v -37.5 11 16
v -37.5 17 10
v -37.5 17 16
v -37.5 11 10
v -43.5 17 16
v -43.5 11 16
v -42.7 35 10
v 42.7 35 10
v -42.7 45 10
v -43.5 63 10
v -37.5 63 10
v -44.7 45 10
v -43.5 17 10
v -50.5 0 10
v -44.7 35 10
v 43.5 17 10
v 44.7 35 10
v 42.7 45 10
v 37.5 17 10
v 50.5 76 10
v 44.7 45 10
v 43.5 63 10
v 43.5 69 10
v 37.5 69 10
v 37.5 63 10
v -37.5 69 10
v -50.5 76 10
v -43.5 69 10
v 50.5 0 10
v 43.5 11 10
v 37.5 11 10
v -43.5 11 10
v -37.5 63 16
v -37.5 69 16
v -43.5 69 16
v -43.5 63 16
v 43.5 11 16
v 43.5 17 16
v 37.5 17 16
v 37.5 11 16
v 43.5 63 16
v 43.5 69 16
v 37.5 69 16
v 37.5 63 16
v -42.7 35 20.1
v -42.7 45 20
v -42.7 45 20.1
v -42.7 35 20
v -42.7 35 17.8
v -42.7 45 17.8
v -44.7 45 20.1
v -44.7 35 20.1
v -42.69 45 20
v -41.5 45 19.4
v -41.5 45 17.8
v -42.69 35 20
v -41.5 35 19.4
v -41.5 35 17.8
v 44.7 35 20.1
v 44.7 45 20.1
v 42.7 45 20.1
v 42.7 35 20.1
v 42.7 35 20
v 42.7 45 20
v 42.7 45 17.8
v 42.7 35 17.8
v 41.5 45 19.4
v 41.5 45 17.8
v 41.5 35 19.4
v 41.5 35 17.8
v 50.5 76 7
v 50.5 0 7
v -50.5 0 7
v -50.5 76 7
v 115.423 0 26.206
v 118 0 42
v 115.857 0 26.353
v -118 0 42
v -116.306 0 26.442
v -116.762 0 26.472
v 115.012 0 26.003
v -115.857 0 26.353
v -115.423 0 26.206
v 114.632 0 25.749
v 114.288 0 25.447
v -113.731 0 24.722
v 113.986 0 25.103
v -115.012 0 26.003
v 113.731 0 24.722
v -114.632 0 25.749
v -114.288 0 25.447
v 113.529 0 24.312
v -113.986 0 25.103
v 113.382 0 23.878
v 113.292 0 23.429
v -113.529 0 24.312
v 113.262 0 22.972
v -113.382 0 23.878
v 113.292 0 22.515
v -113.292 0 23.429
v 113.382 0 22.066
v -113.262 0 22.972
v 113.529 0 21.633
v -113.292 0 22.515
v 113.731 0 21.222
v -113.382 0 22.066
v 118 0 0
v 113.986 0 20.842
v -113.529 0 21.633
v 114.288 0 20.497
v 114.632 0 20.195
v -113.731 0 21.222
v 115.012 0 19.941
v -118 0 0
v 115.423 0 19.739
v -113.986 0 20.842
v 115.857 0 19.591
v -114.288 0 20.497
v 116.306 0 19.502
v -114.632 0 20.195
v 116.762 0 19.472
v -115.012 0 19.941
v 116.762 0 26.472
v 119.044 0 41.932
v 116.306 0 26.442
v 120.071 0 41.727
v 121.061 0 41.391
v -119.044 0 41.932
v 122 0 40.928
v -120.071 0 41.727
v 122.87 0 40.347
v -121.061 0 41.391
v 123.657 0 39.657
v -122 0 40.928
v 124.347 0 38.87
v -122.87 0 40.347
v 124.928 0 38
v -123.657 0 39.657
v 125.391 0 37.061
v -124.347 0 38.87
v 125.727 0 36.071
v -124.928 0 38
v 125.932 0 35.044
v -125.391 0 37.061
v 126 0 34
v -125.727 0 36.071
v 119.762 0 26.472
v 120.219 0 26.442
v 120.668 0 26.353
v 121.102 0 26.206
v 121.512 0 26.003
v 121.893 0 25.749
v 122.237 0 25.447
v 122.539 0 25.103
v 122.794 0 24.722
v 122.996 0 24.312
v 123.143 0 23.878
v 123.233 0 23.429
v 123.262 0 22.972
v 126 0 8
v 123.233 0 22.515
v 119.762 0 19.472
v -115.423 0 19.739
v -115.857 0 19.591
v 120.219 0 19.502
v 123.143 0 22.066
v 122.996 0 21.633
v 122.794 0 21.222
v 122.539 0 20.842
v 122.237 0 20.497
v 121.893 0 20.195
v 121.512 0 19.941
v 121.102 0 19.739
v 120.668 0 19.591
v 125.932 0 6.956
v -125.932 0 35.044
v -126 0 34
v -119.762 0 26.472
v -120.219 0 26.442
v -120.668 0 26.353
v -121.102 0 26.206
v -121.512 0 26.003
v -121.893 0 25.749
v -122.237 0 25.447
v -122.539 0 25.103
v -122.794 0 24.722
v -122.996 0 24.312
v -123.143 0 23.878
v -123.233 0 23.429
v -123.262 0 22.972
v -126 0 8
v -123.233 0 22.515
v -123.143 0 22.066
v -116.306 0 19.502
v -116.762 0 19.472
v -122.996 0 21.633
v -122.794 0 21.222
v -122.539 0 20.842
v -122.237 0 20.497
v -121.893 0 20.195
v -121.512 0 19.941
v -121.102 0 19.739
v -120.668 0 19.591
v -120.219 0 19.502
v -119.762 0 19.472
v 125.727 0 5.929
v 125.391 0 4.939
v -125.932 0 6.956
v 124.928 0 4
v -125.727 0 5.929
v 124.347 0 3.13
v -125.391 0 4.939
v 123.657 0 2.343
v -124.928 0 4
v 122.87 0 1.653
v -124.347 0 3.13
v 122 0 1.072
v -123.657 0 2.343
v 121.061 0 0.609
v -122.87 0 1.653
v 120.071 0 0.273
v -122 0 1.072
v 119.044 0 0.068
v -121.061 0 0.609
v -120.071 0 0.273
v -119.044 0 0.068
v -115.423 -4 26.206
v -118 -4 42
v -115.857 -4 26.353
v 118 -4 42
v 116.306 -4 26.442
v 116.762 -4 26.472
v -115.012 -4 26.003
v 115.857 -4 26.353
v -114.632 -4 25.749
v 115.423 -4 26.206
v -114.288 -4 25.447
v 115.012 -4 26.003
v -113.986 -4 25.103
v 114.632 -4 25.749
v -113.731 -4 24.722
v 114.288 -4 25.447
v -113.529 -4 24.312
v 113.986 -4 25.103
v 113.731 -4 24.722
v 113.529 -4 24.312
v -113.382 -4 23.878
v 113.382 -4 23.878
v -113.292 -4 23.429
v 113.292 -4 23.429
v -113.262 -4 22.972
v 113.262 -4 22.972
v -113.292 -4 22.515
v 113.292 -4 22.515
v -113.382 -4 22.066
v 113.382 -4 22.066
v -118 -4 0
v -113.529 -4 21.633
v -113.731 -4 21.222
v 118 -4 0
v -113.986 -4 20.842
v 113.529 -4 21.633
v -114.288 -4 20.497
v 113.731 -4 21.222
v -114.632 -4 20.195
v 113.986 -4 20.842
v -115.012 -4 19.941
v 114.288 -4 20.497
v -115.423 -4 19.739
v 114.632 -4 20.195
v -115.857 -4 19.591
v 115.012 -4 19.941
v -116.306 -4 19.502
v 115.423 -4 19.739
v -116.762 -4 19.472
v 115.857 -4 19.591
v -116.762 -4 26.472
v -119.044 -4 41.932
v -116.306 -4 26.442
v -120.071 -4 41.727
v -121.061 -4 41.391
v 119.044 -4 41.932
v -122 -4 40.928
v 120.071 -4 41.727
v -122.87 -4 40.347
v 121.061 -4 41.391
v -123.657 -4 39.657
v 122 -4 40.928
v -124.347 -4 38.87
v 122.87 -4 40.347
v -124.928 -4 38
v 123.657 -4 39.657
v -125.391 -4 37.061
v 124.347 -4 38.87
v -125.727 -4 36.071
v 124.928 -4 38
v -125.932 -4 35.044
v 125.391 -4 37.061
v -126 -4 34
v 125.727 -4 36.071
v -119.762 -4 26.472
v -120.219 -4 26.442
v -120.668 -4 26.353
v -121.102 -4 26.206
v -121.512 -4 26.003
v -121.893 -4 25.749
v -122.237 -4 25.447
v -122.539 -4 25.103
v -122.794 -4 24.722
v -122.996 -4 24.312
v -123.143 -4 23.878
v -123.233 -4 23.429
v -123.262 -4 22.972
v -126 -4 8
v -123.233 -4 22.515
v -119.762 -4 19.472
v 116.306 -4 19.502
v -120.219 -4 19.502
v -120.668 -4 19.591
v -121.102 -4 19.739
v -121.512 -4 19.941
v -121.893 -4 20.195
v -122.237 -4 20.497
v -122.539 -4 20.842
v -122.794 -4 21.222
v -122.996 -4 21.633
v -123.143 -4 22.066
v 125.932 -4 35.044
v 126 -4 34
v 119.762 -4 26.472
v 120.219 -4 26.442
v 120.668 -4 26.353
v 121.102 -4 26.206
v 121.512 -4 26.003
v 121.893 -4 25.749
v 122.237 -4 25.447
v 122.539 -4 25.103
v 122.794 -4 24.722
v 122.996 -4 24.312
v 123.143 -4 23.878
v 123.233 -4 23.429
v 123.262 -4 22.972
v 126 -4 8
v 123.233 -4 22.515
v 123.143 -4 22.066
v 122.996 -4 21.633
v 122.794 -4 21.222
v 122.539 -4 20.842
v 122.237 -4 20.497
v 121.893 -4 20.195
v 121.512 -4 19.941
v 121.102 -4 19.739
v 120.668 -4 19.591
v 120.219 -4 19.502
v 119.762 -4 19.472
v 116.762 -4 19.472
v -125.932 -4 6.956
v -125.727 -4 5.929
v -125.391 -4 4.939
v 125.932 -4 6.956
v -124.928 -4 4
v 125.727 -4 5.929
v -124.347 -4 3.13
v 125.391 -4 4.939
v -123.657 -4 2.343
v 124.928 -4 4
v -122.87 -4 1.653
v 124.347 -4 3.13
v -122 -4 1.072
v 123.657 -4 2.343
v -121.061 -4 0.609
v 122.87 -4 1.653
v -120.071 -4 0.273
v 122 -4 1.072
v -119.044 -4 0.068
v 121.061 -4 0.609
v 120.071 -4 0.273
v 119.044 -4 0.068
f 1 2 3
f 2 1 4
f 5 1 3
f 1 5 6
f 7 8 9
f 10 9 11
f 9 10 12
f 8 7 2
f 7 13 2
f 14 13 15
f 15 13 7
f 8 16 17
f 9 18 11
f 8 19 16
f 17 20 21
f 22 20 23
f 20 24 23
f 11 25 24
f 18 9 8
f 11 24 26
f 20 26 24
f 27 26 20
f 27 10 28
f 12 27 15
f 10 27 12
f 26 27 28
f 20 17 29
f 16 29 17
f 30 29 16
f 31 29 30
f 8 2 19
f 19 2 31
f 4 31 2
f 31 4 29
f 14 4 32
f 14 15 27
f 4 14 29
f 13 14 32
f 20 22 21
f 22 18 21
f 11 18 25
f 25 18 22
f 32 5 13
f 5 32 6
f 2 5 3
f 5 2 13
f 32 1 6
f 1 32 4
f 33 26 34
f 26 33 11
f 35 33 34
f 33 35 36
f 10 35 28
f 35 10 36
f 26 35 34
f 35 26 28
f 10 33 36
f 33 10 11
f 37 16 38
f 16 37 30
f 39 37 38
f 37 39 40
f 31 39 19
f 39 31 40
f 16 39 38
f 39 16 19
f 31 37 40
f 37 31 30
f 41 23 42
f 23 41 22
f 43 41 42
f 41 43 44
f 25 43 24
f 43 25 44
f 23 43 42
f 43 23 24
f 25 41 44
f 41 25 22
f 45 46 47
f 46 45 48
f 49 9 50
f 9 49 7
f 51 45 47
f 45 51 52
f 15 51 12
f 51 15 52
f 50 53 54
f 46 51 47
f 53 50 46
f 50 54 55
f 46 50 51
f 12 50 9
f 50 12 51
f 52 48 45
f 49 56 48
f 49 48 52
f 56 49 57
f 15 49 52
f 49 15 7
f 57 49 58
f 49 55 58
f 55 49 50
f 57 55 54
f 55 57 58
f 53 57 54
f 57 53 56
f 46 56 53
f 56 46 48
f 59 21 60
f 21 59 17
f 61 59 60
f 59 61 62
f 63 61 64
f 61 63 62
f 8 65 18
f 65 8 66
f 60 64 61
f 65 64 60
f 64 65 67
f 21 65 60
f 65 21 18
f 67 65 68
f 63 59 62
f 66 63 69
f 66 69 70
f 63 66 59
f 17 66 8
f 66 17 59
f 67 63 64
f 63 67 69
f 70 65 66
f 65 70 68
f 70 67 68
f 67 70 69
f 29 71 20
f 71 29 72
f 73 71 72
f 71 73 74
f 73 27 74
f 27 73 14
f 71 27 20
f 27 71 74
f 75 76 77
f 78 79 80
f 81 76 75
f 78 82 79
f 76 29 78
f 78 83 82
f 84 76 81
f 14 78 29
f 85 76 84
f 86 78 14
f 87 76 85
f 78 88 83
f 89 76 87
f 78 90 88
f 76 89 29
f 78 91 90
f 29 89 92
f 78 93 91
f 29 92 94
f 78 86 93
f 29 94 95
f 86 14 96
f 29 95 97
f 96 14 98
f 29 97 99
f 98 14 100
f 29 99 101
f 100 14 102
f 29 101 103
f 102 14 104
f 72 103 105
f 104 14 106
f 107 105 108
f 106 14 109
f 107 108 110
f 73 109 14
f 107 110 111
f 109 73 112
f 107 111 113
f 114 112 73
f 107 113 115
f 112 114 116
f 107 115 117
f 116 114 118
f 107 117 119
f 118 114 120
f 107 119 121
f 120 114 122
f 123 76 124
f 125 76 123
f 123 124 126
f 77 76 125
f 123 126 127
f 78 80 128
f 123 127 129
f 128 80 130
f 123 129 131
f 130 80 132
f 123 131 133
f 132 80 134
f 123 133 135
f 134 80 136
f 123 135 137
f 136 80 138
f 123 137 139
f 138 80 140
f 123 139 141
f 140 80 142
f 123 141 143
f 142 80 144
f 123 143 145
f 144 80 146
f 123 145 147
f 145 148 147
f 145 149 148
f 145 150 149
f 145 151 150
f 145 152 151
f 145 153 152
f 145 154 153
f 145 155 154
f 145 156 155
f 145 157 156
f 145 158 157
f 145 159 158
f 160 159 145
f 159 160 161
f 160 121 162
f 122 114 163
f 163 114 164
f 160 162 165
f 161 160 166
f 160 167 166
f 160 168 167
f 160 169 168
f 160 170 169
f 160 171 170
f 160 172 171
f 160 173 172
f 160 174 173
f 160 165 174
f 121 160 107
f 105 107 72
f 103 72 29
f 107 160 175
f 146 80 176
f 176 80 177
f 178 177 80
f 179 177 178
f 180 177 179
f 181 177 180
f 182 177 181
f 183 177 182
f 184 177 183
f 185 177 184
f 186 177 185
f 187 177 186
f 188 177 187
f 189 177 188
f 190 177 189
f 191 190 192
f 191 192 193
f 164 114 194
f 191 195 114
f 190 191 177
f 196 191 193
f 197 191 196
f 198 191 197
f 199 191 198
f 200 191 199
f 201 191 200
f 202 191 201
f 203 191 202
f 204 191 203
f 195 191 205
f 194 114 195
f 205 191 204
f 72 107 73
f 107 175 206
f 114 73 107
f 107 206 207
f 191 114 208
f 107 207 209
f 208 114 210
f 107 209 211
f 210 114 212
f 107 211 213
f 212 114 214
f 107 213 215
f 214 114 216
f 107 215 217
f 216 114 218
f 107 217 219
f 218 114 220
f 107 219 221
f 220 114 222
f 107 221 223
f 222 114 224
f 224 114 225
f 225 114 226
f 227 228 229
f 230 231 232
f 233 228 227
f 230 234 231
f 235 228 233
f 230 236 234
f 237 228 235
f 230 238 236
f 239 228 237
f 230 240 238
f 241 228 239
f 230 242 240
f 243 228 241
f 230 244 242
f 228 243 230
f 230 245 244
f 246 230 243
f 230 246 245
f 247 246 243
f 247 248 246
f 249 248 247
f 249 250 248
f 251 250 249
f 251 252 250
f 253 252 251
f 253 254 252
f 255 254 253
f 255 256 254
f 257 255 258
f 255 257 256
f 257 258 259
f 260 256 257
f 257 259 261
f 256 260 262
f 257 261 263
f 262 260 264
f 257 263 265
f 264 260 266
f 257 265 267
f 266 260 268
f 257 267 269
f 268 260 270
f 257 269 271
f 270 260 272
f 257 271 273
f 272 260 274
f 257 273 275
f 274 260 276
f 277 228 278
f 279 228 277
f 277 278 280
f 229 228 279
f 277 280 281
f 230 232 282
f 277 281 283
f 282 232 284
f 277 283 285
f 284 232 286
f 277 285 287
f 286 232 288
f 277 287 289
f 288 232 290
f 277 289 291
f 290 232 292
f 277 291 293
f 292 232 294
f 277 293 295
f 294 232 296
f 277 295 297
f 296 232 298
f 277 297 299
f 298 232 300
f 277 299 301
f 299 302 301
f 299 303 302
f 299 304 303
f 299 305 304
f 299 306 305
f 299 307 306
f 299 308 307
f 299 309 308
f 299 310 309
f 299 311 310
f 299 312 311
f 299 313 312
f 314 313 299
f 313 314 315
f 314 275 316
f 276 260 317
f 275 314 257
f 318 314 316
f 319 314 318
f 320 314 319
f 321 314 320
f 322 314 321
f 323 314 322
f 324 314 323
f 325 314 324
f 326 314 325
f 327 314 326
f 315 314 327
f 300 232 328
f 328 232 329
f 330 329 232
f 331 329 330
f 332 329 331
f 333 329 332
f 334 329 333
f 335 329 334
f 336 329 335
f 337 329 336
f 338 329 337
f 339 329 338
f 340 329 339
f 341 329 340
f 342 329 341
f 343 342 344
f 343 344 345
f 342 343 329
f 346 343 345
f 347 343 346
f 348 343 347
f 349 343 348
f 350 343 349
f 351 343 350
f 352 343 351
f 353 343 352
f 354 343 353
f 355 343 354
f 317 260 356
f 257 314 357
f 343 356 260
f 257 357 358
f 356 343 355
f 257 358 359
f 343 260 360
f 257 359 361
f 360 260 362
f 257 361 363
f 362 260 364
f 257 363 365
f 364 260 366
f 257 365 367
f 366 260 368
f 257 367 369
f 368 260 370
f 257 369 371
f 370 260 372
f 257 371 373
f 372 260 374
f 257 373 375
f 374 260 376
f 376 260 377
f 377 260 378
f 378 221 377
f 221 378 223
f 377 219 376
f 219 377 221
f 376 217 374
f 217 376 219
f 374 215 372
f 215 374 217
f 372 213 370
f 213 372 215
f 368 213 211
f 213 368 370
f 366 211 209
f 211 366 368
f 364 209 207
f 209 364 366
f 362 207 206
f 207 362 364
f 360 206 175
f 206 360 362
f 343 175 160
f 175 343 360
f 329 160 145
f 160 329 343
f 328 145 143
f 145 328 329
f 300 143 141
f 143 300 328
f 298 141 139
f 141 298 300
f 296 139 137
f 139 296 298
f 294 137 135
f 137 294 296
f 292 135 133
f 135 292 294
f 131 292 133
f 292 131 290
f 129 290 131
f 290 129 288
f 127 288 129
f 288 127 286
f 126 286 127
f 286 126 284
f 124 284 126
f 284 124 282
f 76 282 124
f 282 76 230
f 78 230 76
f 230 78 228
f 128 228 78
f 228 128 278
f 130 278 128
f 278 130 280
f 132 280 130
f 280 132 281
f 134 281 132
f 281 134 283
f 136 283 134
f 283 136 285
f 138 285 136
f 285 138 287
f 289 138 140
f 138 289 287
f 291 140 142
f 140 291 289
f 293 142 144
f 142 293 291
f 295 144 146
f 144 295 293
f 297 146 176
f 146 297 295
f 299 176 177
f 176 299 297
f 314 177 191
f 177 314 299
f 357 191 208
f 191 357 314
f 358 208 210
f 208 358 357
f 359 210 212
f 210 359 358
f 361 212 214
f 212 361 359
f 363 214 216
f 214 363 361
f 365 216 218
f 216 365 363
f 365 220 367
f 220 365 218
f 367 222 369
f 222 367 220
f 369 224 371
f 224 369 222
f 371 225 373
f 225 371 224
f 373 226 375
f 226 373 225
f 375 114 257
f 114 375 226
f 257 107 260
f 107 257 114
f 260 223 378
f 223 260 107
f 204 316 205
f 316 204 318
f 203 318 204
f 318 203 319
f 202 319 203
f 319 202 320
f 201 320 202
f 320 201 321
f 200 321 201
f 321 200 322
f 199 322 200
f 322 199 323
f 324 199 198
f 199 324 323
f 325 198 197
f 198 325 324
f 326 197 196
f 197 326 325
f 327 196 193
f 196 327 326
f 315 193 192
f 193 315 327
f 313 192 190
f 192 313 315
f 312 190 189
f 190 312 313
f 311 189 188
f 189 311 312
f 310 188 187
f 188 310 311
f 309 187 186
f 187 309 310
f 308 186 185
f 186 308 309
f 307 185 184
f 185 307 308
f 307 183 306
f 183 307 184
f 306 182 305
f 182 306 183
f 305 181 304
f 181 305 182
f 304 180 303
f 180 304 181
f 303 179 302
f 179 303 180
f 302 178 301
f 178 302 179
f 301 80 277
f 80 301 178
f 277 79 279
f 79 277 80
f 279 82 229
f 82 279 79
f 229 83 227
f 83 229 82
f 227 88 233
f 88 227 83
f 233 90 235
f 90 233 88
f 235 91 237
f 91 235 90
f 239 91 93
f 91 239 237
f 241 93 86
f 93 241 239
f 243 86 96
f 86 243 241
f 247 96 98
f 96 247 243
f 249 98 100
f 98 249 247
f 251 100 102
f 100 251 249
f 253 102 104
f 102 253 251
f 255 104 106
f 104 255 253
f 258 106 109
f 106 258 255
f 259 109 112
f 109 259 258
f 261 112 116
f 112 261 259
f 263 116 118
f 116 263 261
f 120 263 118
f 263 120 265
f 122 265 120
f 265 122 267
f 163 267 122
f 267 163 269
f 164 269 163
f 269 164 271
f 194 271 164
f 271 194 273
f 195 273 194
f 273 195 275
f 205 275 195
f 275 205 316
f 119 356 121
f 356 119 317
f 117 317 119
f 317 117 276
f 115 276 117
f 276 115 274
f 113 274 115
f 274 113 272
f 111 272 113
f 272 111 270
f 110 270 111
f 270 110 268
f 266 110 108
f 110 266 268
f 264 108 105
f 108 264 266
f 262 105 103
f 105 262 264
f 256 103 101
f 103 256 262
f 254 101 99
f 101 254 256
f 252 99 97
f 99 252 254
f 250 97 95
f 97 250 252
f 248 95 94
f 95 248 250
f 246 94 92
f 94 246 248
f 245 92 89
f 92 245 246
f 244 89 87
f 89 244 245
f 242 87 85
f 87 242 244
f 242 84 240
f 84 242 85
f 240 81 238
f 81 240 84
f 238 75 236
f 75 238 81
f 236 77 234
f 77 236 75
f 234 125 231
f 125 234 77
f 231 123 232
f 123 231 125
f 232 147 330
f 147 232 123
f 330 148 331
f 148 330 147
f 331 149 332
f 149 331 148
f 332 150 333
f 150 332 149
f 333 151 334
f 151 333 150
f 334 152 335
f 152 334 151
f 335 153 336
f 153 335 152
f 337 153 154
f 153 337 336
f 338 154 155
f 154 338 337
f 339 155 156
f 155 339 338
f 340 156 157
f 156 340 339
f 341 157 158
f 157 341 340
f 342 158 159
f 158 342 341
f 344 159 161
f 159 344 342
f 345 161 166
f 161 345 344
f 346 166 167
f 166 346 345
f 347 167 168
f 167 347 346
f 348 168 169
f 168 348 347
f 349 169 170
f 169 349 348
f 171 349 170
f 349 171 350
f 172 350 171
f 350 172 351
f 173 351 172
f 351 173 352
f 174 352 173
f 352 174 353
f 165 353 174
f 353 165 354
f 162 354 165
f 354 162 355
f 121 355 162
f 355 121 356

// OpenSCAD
// Lab Rax generic equipment tray + faceplate (wizard template).
// Faceplate = the Pi4 baseline faceplate (pi4_baseline.scad), generalised to N U.
// The wizard appends override assignments at the end of this file.
// PROPOSED, UNVALIDATED: printed fit, strength and rack clearance are UNKNOWN.
$fn=48;
part="assembly";            // assembly, faceplate, tray, combined
// Device envelope (mm). Origin of hole coordinates = device front-left corner, seen from above.
dev_w=85; dev_d=56; dev_h=20;
holes=[];                   // [[x,y],...] mounting hole centres
hole_d=2.7;                 // device mounting hole diameter
device_mount="inserts";     // inserts, pegs, clips, straps
standoff=6;                 // device lift above tray floor
insert_pilot=3.2;           // pilot for heat-set insert (inserts mode)
board_t=1.6;                // board/flange thickness (pegs, clips)
joint="screw";              // screw, snap, single
u=1;                        // faceplate height in rack units
keystones=[];               // [x,...] keystone centres on faceplate (X=0 centre)
ks_w=14.5; ks_h=16;         // standard keystone opening
ports=[];                   // [[x,z,w,h,r],...] faceplate cut-outs, z from plate bottom, r=corner radius
front_gap=12;               // device front to faceplate rear face
margin=8;                   // tray border around device

// Owner default 2026-10-18: 4 mm thick plate with rounded corners (Pi4 print was 3 mm, square).
plate_w=252; plate_t=4; plate_r=8; plate_h=u*44.45-2.45;
nudge=0;                    // render-repair only: tiny size offset applied when OpenSCAD 2021 emits a sliver
ks_front=2;                // keystone clips need a thin wall: plate is pocketed from behind down to this
tray_t=3; tray_z=7;
tray_w=dev_w+2*margin; tray_d=dev_d+front_gap+margin;
tray_x=-tray_w/2; tray_y=0;
dev_x=-dev_w/2; dev_y=front_gap; floor_top=tray_z+tray_t;
jx=min(40,tray_w/2-12); joint_x=[-jx,jx];
tongue_w=12; tongue_depth=7; tongue_h=3; tongue_z=tray_z+3.5;
slot_clear=0.3; boss_d=9; m3_clear=3.4; joint_pilot=4.0;  // 4.0 = the printed, well-fitting Pi4 trial

module capsule2d(len=10,diam=7){hull(){translate([-(len-diam)/2,0])circle(d=diam);translate([(len-diam)/2,0])circle(d=diam);}}
module rrect(w,h,r){rr=min(r,w/2-0.01,h/2-0.01);if(rr<=0)square([w,h],center=true);else offset(r=rr)square([w-2*rr,h-2*rr],center=true);}

// Faceplate outline seen from the front: 2D X = rack X, 2D Y = height Z.
// rear=true cuts the larger keystone pocket instead of the keystone opening.
module plate2d(rear=false){
 difference(){
  hull()for(sx=[-1,1],sz=[-1,1])translate([sx*(plate_w/2-plate_r),plate_h/2+sz*(plate_h/2-plate_r)])circle(r=plate_r+nudge);
  for(i=[0:u-1],x=[-118.2625,118.2625])translate([x,i*44.45+21+1.9722])capsule2d();
  for(x=keystones)if(rear)translate([x,plate_h/2])square([ks_w+4+nudge,ks_h+6+nudge],center=true);
                  else translate([x,plate_h/2])square([ks_w,ks_h],center=true);
  for(p=ports)translate([p[0],p[1]])rrect(p[2],p[3],p[4]);
 }
}
// Plate between y=y0 (front) and y0+t, built from the 2D outline (cleaner meshes than 3D cuts in OpenSCAD 2021).
module plate_layer(y0,t,rear=false){translate([0,y0+t,0])rotate([90,0,0])linear_extrude(height=t)plate2d(rear);}

module faceplate(){
 difference(){
  union(){
   // Front layer keeps the keystone opening; with keystones, the rear layer is pocketed so jacks grip ks_front.
   if(len(keystones)>0&&plate_t>ks_front){plate_layer(-plate_t,ks_front);plate_layer(-plate_t+ks_front,plate_t-ks_front,true);}
   else plate_layer(-plate_t,plate_t);
   if(joint=="screw"){
    for(x=joint_x)translate([x-tongue_w/2,0,tongue_z])cube([tongue_w,tongue_depth,tongue_h]);
    for(x=joint_x)translate([x,0,tray_z+14])rotate([-90,0,0])cylinder(d=boss_d,h=8);
   }
   if(joint=="snap") for(x=joint_x){
    // Cantilever arm under the tray floor; barb snaps up into a floor window.
    translate([x-4,0,tray_z-2])cube([8,16,2]);
    translate([x-4,12,tray_z])hull(){cube([8,4,0.01]);translate([0,3.4,0])cube([8,0.6,1.2]);}
   }
  }
  if(joint=="screw")for(x=joint_x)translate([x,-0.1,tray_z+14])rotate([-90,0,0])cylinder(d=joint_pilot,h=8.2);
 }
}

module device_features_add(){
 if(device_mount=="inserts")for(h=holes)translate([dev_x+h[0],dev_y+h[1],floor_top])cylinder(d=max(insert_pilot+3.5,7),h=standoff);
 if(device_mount=="pegs")for(h=holes)translate([dev_x+h[0],dev_y+h[1],floor_top]){
  cylinder(d=hole_d+3,h=standoff);
  translate([0,0,standoff])cylinder(d=hole_d-0.3,h=board_t+0.8);
  translate([0,0,standoff+board_t+0.8])cylinder(d1=hole_d-0.3,d2=hole_d-1,h=0.8);
 }
 if(device_mount=="clips"){
  // Support ledges at the four corners plus a flexing clip on each side.
  for(x=[dev_x-1,dev_x+dev_w-5],y=[dev_y-1,dev_y+dev_d-5])translate([x,y,floor_top])cube([6,6,standoff]);
  for(s=[-1,1])translate([s>0?dev_x+dev_w+0.2:dev_x-2.2,dev_y+dev_d/2-5,floor_top]){
   cube([2,10,standoff+board_t+2.5]);
   translate([s>0?-1.2:2,0,standoff+board_t+0.2])hull(){cube([1.2,10,1.6]);translate([s>0?1.2:0,0,1.6])cube([0.01,10,0.6]);}
  }
 }
}
module device_features_cut(){
 if(device_mount=="inserts")for(h=holes)translate([dev_x+h[0],dev_y+h[1],floor_top+0.01])cylinder(d=insert_pilot,h=standoff+0.1);
 if(device_mount=="straps")for(x=[dev_x-5.5,dev_x+dev_w+2.5],y=[dev_y+dev_d*0.25,dev_y+dev_d*0.75])
  translate([x,y-6,tray_z-0.1])cube([3,12,tray_t+0.2]);
}

module tray(){
 difference(){
  union(){
   translate([tray_x,tray_y,tray_z])cube([tray_w,tray_d,tray_t]);
   if(joint=="screw"){
    for(x=joint_x) translate([x-9,0,tray_z+tray_t])cube([18,8,5]);
    for(x=joint_x)translate([x-7,8.3,tray_z+3])cube([14,3,19]);
    for(x=joint_x) for(side=[-1,1]) translate([x+side*6-1,0,0])
      hull(){translate([0,9,tray_z+2.7])cube([2,2,0.5]);
             translate([0,9,tray_z+8])cube([2,2,0.5]);
             translate([0,20,tray_z+2.7])cube([2,2,0.5]);}
   }
   device_features_add();
  }
  if(joint=="screw"){
   for(x=joint_x)translate([x-(tongue_w+slot_clear)/2,-0.1,tongue_z-slot_clear/2])cube([tongue_w+slot_clear,tongue_depth+slot_clear,tongue_h+slot_clear]);
   for(x=joint_x)translate([x,11.4,tray_z+14])rotate([90,0,0])cylinder(d=m3_clear,h=12);
  }
  if(joint=="snap")for(x=joint_x)translate([x-4.3,14.8,tray_z-0.1])cube([8.6,1.6,tray_t+0.2]);
  device_features_cut();
 }
}

if(part=="faceplate")faceplate();
else if(part=="tray")tray();
else if(part=="combined")union(){faceplate();translate([tray_x,-0.01,tray_z])cube([tray_w,0.02+0.01,tray_t]);tray();}
else {color("steelblue")faceplate();color("silver")tray();
 %translate([dev_x,dev_y,floor_top+(device_mount=="inserts"||device_mount=="pegs"||device_mount=="clips"?standoff:0)])cube([dev_w,dev_d,dev_h]);}

// ---- wizard overrides: C_Pi4_clips_singlepiece
dev_w=85.0;
dev_d=56.0;
dev_h=20.0;
hole_d=2.7;
standoff=6.0;
insert_pilot=3.2;
board_t=1.6;
u=1;
holes=[[3.5, 3.5], [61.5, 3.5], [3.5, 52.5], [61.5, 52.5]];
keystones=[];
device_mount="clips";
joint="single";
ports=[];
